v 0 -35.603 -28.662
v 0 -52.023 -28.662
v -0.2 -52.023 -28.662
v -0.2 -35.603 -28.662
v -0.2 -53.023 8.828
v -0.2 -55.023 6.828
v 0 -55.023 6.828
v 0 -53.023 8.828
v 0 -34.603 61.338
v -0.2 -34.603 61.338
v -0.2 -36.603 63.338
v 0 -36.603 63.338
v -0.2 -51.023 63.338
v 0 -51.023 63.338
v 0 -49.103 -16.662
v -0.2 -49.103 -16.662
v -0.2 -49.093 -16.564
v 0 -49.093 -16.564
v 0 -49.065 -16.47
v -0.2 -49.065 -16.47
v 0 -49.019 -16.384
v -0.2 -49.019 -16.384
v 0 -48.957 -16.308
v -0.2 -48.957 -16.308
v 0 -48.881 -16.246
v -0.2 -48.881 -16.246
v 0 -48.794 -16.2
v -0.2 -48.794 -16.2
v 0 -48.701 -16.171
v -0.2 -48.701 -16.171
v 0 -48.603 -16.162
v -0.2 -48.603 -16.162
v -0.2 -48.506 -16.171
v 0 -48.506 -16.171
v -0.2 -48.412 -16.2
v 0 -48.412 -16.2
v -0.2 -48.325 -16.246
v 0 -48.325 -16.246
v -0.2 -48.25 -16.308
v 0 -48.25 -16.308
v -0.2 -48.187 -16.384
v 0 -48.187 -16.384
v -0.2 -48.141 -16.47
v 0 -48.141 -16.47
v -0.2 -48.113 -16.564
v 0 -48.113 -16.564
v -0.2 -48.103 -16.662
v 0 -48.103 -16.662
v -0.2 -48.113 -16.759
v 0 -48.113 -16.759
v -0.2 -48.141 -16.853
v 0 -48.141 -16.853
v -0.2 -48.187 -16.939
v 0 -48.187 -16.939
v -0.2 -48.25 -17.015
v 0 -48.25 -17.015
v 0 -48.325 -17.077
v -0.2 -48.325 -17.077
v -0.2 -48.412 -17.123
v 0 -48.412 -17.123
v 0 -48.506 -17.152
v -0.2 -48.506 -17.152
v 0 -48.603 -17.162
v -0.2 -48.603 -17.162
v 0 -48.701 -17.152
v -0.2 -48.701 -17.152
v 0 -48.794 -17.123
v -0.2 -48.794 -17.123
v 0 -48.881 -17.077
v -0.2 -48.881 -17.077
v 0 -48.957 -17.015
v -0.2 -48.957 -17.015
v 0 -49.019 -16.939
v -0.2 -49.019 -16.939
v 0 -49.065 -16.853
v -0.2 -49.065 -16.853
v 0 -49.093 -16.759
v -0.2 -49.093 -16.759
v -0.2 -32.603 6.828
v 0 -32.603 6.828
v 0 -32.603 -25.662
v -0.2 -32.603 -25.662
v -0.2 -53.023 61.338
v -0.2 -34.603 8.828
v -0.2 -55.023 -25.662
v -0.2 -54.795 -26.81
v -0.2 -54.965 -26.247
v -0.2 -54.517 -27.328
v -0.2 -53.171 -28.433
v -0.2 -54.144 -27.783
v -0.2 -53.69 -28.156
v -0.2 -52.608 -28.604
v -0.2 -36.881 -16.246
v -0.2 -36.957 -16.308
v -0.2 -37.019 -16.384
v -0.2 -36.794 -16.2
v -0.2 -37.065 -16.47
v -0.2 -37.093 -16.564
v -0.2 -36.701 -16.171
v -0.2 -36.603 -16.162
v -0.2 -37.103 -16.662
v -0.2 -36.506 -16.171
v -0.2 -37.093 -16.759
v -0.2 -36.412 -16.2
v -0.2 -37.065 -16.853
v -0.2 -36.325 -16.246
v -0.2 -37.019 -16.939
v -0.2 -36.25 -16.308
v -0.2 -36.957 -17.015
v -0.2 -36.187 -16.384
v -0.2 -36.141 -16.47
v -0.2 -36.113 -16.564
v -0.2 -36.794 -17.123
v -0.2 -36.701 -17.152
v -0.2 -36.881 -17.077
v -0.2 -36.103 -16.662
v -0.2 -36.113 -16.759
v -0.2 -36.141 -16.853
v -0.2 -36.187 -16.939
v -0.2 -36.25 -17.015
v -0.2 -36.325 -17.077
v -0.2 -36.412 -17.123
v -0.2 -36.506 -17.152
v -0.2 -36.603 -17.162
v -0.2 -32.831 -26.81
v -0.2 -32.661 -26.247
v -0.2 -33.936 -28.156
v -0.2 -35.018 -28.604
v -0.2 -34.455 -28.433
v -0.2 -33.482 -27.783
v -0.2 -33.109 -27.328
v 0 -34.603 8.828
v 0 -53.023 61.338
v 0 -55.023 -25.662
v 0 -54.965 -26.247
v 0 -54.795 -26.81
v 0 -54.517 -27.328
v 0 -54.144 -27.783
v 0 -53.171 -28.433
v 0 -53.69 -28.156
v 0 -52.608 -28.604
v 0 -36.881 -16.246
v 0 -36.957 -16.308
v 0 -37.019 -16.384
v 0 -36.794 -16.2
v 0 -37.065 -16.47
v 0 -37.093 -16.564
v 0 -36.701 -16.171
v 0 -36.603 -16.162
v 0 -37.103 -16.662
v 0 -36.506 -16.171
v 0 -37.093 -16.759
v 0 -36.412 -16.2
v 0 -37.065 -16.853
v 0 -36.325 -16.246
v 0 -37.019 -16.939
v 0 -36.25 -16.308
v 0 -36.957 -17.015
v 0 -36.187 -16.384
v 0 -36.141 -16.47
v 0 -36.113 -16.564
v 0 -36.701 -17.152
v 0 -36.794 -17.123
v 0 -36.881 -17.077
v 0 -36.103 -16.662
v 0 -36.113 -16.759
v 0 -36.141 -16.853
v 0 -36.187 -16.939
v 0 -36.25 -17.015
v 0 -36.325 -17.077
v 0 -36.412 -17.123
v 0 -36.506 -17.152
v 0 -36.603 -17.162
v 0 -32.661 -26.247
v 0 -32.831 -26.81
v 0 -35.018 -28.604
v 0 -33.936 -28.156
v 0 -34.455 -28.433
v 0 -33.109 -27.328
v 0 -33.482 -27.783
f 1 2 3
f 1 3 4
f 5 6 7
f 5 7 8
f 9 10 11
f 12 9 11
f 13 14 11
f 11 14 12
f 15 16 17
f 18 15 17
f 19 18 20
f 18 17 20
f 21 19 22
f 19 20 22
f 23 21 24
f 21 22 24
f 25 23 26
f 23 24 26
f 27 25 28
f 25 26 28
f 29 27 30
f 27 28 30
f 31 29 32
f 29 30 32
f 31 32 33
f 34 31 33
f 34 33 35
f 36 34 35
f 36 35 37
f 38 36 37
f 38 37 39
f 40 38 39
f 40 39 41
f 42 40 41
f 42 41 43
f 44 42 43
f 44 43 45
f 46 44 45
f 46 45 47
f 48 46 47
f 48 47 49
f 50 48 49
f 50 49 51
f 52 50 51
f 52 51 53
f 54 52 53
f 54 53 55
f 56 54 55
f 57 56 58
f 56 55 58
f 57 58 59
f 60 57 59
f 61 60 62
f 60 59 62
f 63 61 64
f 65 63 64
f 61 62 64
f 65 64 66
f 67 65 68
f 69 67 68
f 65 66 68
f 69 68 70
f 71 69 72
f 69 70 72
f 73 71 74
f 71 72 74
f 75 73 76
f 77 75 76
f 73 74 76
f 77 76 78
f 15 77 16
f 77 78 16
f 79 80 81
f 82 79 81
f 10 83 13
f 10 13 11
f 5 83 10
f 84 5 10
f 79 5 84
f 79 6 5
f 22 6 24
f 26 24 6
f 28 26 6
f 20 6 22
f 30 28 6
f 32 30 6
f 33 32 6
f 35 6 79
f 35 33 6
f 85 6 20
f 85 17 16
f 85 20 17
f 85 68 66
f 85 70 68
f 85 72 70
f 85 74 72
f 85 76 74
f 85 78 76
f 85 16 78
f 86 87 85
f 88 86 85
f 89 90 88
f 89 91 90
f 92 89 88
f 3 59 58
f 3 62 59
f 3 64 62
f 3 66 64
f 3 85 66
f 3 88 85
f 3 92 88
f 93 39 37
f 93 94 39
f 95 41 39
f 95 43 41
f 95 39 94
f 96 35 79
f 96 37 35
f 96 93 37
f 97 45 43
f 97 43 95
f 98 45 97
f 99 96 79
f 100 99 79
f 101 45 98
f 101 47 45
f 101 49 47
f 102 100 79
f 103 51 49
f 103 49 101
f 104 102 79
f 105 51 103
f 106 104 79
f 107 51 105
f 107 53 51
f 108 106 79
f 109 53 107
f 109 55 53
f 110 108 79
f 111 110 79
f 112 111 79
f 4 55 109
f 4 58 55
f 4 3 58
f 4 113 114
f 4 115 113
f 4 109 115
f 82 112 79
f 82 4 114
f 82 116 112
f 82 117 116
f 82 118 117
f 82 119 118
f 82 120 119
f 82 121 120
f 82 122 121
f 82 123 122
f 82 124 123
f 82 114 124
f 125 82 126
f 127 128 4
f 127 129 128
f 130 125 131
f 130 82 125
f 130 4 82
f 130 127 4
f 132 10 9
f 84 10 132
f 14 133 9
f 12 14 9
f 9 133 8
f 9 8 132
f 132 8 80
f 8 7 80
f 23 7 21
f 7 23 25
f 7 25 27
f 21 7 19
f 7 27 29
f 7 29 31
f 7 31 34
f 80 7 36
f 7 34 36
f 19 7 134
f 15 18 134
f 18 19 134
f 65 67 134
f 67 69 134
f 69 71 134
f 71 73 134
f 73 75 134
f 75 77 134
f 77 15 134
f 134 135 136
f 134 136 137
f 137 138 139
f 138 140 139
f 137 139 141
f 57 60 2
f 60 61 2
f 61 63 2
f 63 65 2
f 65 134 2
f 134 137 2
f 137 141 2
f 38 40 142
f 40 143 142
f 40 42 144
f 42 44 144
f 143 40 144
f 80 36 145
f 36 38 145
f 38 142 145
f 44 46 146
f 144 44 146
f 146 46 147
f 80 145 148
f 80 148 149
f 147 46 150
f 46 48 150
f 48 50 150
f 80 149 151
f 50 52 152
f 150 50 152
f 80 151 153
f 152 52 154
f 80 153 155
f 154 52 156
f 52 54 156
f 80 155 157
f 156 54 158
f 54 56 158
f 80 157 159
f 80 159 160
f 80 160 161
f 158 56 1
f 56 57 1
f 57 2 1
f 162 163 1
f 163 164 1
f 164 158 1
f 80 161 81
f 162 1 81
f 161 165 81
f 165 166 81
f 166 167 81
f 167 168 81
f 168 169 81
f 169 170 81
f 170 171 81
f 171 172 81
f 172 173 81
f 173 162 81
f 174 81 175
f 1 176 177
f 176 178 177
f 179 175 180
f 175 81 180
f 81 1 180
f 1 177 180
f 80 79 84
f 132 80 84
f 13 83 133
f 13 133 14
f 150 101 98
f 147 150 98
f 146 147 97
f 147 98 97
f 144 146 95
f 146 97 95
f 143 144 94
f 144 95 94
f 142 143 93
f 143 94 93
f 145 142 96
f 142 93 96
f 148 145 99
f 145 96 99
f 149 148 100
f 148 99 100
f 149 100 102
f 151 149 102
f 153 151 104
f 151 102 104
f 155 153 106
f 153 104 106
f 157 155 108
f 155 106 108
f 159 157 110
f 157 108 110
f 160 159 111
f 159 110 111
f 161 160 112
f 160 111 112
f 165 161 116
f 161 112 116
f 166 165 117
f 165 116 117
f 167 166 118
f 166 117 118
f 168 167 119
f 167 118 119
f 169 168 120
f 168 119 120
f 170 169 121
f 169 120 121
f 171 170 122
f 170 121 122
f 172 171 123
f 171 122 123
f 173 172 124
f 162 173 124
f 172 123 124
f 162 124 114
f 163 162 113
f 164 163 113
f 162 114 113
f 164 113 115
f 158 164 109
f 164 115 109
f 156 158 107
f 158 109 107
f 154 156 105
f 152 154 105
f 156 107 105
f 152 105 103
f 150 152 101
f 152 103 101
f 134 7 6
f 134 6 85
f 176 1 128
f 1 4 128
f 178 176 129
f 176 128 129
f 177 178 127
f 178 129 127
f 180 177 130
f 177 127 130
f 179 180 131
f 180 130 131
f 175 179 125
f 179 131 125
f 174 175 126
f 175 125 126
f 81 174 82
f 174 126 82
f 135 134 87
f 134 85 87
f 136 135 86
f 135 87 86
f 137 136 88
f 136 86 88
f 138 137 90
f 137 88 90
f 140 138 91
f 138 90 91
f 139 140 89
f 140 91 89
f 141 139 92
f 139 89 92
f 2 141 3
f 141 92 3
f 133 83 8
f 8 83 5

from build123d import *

# Parameters (mm, degrees)
SKETCH2_W           = 22.42
SKETCH2_H           = 92
BOSS_EXTRUDE2_DEPTH = 0.2
FILLET4_R           = 3
FILLET7_R           = 3
SKETCH4_W           = 2
SKETCH4_H           = 54.51
CUT_EXTRUDE1_DEPTH  = 0.2
SKETCH5_W           = 2
SKETCH5_H           = 54.51
CUT_EXTRUDE2_DEPTH  = 0.2
CUT_EXTRUDE3_DEPTH  = 0.2
CUT_EXTRUDE4_DEPTH  = 0.2
CUT_EXTRUDE7_DEPTH  = 0.2
CUT_EXTRUDE8_DEPTH  = 0.2
SKETCH13_R          = 0.5
CUT_EXTRUDE12_DEPTH = 10
SKETCH15_R          = 0.5
CUT_EXTRUDE13_DEPTH = 0.2


with BuildPart() as part:
    # Sketch2 → Boss-Extrude2 (new body)
    with BuildSketch(Plane(origin=(0, 0, 0), x_dir=(0, 1, 0), z_dir=(-1, 0, 0))):
        with Locations((-43.813076923, -17.338461538)):
            Rectangle(SKETCH2_W, SKETCH2_H)
    extrude(amount=BOSS_EXTRUDE2_DEPTH)

    # Fillet4
    fillet4_edges = [part.edges().sort_by_distance(p)[0] for p in [
        (-0.1, -55.023076923, -28.661538462),
    ]]
    fillet(fillet4_edges, radius=FILLET4_R)

    # Fillet7
    fillet7_edges = [part.edges().sort_by_distance(p)[0] for p in [
        (-0.1, -32.603076923, -28.661538462),
    ]]
    fillet(fillet7_edges, radius=FILLET7_R)

    # Sketch4 → Cut-Extrude1 (cut)
    with BuildSketch(Plane(origin=(-0.2, 0, 0), x_dir=(0, 1, 0), z_dir=(-1, 0, 0))):
        with Locations((-54.023076923, -36.083461538)):
            Rectangle(SKETCH4_W, SKETCH4_H)
    extrude(amount=-CUT_EXTRUDE1_DEPTH, mode=Mode.SUBTRACT)

    # Sketch5 → Cut-Extrude2 (cut)
    with BuildSketch(Plane(origin=(-0.2, 0, 0), x_dir=(0, 1, 0), z_dir=(-1, 0, 0))):
        with Locations((-33.603076923, -36.083461538)):
            Rectangle(SKETCH5_W, SKETCH5_H)
    extrude(amount=-CUT_EXTRUDE2_DEPTH, mode=Mode.SUBTRACT)

    # Sketch6 → Cut-Extrude3 (cut)
    with BuildSketch(Plane(origin=(-0.2, 0, 0), x_dir=(0, 1, 0), z_dir=(-1, 0, 0))):
        Polygon((-53.023076923, -63.338461538), (-53.023076923, -61.338461538), (-51.023076923, -63.338461538), align=None)
    extrude(amount=-CUT_EXTRUDE3_DEPTH, mode=Mode.SUBTRACT)

    # Sketch7 → Cut-Extrude4 (cut)
    with BuildSketch(Plane(origin=(-0.2, 0, 0), x_dir=(0, 1, 0), z_dir=(-1, 0, 0))):
        Polygon((-34.603076923, -63.338461538), (-34.603076923, -61.338461538), (-36.603076923, -63.338461538), align=None)
    extrude(amount=-CUT_EXTRUDE4_DEPTH, mode=Mode.SUBTRACT)

    # Sketch8 → Cut-Extrude7 (cut)
    with BuildSketch(Plane(origin=(-0.2, 0, 0), x_dir=(0, 1, 0), z_dir=(-1, 0, 0))):
        Polygon((-53.023076923, -8.828461538), (-55.023076923, -8.828461538), (-55.023076923, -6.828461538), align=None)
    extrude(amount=-CUT_EXTRUDE7_DEPTH, mode=Mode.SUBTRACT)

    # Sketch9 → Cut-Extrude8 (cut)
    with BuildSketch(Plane(origin=(-0.2, 0, 0), x_dir=(0, 1, 0), z_dir=(-1, 0, 0))):
        Polygon((-34.603076923, -8.828461538), (-32.603076923, -8.828461538), (-32.603076923, -6.828461538), align=None)
    extrude(amount=-CUT_EXTRUDE8_DEPTH, mode=Mode.SUBTRACT)

    # Sketch13 → Cut-Extrude12 (cut)
    with BuildSketch(Plane(origin=(-0.2, 0, 0), x_dir=(0, 1, 0), z_dir=(-1, 0, 0))):
        with Locations(Location((-48.603076923, 16.661538462, 0), (0, 0, 180))):
            Circle(SKETCH13_R)
    extrude(amount=-CUT_EXTRUDE12_DEPTH, mode=Mode.SUBTRACT)

    # Sketch15 → Cut-Extrude13 (cut)
    with BuildSketch(Plane(origin=(-0.2, 0, 0), x_dir=(0, 1, 0), z_dir=(-1, 0, 0))):
        with Locations(Location((-36.603076923, 16.661538462, 0), (0, 0, 180))):
            Circle(SKETCH15_R)
    extrude(amount=-CUT_EXTRUDE13_DEPTH, mode=Mode.SUBTRACT)


solid = part.part
